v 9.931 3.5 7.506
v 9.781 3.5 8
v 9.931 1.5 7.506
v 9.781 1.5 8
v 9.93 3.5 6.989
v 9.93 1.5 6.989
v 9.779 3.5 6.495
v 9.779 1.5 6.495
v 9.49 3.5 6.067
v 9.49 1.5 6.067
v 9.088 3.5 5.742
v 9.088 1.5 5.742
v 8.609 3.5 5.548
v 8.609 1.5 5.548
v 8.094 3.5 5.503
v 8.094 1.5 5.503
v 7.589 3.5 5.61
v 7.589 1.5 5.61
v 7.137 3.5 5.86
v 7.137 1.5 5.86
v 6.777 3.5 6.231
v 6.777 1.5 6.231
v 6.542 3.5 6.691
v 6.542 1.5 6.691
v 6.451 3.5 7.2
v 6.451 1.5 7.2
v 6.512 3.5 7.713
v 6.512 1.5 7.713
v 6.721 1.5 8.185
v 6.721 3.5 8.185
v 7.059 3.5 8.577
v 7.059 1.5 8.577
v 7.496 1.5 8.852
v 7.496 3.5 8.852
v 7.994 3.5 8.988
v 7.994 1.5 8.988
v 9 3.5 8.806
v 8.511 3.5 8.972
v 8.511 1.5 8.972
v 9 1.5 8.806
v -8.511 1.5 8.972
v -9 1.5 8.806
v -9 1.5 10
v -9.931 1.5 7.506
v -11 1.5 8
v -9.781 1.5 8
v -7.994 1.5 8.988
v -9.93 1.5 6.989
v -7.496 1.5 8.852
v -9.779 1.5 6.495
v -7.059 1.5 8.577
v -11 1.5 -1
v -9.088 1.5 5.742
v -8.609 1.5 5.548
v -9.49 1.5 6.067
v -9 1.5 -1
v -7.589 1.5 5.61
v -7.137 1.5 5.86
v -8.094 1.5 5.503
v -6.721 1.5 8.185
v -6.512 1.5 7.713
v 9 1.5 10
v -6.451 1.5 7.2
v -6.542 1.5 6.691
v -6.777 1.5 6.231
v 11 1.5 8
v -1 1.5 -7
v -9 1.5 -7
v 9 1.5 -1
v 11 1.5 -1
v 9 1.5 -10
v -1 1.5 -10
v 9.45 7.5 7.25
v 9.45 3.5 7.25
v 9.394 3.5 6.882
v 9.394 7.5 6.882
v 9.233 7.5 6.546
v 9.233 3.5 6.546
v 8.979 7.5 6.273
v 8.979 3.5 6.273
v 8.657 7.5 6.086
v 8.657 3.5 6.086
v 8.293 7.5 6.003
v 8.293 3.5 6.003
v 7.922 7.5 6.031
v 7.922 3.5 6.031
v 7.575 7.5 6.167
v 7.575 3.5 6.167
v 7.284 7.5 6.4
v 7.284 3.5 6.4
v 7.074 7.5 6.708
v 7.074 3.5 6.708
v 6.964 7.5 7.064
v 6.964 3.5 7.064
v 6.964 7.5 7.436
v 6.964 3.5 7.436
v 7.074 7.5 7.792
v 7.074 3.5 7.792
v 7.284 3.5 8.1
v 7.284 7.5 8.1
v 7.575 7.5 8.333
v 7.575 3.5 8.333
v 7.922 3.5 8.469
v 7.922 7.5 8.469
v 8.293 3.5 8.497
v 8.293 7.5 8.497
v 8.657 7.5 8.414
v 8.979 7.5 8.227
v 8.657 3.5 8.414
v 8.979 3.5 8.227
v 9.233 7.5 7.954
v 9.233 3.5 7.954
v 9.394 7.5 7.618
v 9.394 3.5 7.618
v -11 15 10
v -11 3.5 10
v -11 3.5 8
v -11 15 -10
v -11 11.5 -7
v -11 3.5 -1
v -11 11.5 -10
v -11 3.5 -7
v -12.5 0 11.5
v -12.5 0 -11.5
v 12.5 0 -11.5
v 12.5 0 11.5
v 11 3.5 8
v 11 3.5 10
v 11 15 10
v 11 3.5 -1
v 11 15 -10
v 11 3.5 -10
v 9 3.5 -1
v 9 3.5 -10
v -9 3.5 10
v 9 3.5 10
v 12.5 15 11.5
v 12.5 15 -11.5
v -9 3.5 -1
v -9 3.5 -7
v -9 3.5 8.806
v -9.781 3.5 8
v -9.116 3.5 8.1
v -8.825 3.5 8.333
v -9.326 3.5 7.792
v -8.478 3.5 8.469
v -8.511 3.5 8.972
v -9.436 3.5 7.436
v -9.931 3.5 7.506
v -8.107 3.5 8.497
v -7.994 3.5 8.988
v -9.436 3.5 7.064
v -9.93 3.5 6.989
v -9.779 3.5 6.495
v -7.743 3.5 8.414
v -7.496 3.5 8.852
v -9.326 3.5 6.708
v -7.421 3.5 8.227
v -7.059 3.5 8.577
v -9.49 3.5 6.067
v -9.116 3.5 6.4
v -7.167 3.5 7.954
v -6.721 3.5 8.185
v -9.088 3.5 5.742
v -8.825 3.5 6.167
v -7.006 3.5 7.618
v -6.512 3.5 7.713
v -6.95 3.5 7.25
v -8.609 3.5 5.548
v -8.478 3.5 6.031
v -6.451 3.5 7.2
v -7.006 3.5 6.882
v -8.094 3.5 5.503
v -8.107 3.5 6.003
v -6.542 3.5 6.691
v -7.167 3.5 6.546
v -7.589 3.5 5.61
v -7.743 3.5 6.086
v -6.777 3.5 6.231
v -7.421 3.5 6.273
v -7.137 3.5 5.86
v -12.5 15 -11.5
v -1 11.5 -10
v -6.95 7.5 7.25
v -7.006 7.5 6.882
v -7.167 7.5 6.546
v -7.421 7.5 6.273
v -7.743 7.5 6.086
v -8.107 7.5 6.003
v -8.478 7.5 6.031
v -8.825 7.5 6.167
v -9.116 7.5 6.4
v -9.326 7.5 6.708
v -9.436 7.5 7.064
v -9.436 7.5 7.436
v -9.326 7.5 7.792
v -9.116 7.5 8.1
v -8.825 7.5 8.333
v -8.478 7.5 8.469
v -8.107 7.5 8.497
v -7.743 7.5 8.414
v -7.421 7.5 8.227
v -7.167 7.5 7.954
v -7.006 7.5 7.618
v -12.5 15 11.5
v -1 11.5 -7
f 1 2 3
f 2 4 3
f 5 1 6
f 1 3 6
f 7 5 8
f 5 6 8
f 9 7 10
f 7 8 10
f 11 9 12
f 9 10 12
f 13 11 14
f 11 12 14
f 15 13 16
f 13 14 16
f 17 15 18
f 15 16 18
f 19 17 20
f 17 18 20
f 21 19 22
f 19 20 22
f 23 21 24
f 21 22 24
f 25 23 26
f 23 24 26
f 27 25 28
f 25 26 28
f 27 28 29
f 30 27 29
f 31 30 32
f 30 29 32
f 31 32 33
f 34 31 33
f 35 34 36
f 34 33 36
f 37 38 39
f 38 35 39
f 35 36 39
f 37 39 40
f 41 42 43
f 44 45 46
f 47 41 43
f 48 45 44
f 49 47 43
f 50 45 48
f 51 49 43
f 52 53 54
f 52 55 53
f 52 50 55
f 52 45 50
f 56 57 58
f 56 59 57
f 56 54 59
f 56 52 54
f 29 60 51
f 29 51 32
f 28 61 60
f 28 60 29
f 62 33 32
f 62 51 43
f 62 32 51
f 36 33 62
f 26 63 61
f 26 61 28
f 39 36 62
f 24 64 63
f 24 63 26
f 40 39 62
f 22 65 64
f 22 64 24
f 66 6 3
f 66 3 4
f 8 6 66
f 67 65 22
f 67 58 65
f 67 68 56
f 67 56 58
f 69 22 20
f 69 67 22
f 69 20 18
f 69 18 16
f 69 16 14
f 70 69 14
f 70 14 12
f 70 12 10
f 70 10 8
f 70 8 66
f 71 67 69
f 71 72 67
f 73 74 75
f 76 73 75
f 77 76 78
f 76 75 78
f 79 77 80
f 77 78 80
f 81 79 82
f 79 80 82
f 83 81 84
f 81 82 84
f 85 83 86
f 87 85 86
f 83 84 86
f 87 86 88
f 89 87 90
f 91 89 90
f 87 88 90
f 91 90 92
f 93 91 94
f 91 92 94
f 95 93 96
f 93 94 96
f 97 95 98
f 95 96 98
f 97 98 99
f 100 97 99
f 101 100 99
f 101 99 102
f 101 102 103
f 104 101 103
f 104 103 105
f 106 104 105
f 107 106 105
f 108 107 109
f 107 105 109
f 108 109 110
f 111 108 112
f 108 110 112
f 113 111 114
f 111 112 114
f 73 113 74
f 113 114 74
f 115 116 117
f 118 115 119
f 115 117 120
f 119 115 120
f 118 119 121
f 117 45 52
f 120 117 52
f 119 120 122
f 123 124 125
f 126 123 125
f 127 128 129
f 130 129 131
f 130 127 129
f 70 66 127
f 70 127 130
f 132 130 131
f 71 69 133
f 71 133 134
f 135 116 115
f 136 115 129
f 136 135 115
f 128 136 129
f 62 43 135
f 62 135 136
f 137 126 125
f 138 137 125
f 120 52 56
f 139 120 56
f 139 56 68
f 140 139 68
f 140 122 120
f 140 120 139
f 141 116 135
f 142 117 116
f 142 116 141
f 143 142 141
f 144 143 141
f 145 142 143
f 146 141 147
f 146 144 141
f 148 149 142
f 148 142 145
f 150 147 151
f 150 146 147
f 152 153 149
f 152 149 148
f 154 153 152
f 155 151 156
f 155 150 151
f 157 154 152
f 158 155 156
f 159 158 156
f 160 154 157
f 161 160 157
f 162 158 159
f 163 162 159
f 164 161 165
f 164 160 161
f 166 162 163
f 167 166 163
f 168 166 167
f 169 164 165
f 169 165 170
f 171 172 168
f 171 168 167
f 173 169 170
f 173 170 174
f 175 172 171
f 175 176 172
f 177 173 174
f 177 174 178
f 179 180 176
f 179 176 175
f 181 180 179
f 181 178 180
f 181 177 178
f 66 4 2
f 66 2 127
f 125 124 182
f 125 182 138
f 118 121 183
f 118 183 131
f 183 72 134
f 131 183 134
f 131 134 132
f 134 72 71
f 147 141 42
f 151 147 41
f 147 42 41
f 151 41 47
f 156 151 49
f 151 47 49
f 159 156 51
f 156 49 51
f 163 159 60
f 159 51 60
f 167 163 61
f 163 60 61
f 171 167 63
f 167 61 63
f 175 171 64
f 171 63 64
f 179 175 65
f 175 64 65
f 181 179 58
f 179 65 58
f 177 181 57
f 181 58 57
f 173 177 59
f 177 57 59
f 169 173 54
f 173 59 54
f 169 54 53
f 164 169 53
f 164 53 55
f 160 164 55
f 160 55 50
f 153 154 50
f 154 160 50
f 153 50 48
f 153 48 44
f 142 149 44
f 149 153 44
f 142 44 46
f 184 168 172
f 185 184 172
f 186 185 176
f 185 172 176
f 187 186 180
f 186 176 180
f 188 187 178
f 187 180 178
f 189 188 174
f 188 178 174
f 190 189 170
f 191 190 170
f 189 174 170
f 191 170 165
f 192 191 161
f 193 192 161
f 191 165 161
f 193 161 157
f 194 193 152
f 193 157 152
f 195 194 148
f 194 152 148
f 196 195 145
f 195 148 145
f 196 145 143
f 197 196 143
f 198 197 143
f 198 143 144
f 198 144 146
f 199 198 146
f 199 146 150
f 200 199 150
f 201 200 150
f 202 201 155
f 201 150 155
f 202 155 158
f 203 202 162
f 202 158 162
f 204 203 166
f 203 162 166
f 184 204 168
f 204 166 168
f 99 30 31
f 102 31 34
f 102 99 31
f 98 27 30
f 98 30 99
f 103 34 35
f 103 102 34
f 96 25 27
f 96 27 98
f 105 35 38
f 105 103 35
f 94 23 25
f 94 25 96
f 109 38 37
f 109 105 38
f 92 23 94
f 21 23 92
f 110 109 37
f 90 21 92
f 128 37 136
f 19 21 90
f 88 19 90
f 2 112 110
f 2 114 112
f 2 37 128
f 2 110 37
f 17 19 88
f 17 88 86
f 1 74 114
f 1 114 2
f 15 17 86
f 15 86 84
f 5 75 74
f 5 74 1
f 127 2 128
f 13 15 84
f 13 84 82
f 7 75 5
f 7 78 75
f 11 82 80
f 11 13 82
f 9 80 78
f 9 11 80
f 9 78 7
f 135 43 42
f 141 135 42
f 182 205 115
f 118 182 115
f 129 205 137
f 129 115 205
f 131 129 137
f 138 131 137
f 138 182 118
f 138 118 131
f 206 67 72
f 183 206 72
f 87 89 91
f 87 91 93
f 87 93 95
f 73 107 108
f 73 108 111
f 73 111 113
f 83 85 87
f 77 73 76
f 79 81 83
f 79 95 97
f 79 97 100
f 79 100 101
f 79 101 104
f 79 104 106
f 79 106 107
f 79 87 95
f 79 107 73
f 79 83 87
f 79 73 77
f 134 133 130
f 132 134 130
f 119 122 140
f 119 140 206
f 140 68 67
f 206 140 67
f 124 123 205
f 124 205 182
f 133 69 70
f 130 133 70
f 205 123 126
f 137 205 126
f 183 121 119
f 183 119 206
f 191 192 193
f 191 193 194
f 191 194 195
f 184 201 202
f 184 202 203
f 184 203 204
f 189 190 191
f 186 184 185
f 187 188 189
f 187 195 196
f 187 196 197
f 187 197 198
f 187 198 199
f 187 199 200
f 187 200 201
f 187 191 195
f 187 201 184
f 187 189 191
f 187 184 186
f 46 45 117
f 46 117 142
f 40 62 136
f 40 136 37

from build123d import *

# Parameters (mm, degrees)
SKETCH1_W           = 25
SKETCH1_H           = 23
BOSS_EXTRUDE1_DEPTH = 15
SHELL1_T            = -1.5
SKETCH3_W           = 2
SKETCH3_H           = 2
BOSS_EXTRUDE2_DEPTH = 2
SKETCH4_W           = 2
SKETCH4_H           = 7
BOSS_EXTRUDE3_DEPTH = 2
SKETCH5_W           = 10
SKETCH5_H           = 3
BOSS_EXTRUDE4_DEPTH = 10
SKETCH2_R           = 1.75
BOSS_EXTRUDE5_DEPTH = 2
SKETCH6_R           = 1.25
BOSS_EXTRUDE6_DEPTH = 4


with BuildPart() as part:
    # Sketch1 → Boss-Extrude1 (new body)
    with BuildSketch(Plane(origin=(0, 0, 0), x_dir=(1, 0, 0), z_dir=(0, 1, 0))):
        Rectangle(SKETCH1_W, SKETCH1_H)
    extrude(amount=BOSS_EXTRUDE1_DEPTH)

    # Shell1
    shell1_openings = [part.faces().sort_by_distance(p)[0] for p in [
        (0, 15, 0),
    ]]
    offset(amount=SHELL1_T, openings=shell1_openings, kind=Kind.INTERSECTION)

    # Sketch3 → Boss-Extrude2 (add)
    with BuildSketch(Plane(origin=(0, 1.5, 0), x_dir=(1, 0, 0), z_dir=(0, 1, 0))):
        with Locations((-10, 9)):
            Rectangle(SKETCH3_W, SKETCH3_H)
        with Locations((10, 9)):
            Rectangle(SKETCH3_W, SKETCH3_H)
        with Locations((10, -9)):
            Rectangle(SKETCH3_W, SKETCH3_H)
        with Locations((-10, -9)):
            Rectangle(SKETCH3_W, SKETCH3_H)
    extrude(amount=BOSS_EXTRUDE2_DEPTH)

    # Sketch4 → Boss-Extrude3 (add)
    with BuildSketch(Plane(origin=(0, 1.5, 0), x_dir=(1, 0, 0), z_dir=(0, 1, 0))):
        with Locations((-10, 4.5)):
            Rectangle(SKETCH4_W, SKETCH4_H)
        with Locations((10, 4.5)):
            Rectangle(SKETCH4_W, SKETCH4_H)
    extrude(amount=BOSS_EXTRUDE3_DEPTH)

    # Sketch5 → Boss-Extrude4 (add)
    with BuildSketch(Plane(origin=(0, 1.5, 0), x_dir=(1, 0, 0), z_dir=(0, 1, 0))):
        with Locations((-6, 8.5)):
            Rectangle(SKETCH5_W, SKETCH5_H)
    extrude(amount=BOSS_EXTRUDE4_DEPTH)

    # Sketch2 → Boss-Extrude5 (add)
    with BuildSketch(Plane(origin=(0, 1.5, 0), x_dir=(1, 0, 0), z_dir=(0, 1, 0))):
        with Locations((-8.2, -7.25)):
            Circle(SKETCH2_R)
        with Locations((8.2, -7.25)):
            Circle(SKETCH2_R)
    extrude(amount=BOSS_EXTRUDE5_DEPTH)

    # Sketch6 → Boss-Extrude6 (add)
    with BuildSketch(Plane(origin=(0, 3.5, 0), x_dir=(1, 0, 0), z_dir=(0, 1, 0))):
        with Locations((-8.2, -7.25)):
            Circle(SKETCH6_R)
        with Locations((8.2, -7.25)):
            Circle(SKETCH6_R)
    extrude(amount=BOSS_EXTRUDE6_DEPTH)


solid = part.part
